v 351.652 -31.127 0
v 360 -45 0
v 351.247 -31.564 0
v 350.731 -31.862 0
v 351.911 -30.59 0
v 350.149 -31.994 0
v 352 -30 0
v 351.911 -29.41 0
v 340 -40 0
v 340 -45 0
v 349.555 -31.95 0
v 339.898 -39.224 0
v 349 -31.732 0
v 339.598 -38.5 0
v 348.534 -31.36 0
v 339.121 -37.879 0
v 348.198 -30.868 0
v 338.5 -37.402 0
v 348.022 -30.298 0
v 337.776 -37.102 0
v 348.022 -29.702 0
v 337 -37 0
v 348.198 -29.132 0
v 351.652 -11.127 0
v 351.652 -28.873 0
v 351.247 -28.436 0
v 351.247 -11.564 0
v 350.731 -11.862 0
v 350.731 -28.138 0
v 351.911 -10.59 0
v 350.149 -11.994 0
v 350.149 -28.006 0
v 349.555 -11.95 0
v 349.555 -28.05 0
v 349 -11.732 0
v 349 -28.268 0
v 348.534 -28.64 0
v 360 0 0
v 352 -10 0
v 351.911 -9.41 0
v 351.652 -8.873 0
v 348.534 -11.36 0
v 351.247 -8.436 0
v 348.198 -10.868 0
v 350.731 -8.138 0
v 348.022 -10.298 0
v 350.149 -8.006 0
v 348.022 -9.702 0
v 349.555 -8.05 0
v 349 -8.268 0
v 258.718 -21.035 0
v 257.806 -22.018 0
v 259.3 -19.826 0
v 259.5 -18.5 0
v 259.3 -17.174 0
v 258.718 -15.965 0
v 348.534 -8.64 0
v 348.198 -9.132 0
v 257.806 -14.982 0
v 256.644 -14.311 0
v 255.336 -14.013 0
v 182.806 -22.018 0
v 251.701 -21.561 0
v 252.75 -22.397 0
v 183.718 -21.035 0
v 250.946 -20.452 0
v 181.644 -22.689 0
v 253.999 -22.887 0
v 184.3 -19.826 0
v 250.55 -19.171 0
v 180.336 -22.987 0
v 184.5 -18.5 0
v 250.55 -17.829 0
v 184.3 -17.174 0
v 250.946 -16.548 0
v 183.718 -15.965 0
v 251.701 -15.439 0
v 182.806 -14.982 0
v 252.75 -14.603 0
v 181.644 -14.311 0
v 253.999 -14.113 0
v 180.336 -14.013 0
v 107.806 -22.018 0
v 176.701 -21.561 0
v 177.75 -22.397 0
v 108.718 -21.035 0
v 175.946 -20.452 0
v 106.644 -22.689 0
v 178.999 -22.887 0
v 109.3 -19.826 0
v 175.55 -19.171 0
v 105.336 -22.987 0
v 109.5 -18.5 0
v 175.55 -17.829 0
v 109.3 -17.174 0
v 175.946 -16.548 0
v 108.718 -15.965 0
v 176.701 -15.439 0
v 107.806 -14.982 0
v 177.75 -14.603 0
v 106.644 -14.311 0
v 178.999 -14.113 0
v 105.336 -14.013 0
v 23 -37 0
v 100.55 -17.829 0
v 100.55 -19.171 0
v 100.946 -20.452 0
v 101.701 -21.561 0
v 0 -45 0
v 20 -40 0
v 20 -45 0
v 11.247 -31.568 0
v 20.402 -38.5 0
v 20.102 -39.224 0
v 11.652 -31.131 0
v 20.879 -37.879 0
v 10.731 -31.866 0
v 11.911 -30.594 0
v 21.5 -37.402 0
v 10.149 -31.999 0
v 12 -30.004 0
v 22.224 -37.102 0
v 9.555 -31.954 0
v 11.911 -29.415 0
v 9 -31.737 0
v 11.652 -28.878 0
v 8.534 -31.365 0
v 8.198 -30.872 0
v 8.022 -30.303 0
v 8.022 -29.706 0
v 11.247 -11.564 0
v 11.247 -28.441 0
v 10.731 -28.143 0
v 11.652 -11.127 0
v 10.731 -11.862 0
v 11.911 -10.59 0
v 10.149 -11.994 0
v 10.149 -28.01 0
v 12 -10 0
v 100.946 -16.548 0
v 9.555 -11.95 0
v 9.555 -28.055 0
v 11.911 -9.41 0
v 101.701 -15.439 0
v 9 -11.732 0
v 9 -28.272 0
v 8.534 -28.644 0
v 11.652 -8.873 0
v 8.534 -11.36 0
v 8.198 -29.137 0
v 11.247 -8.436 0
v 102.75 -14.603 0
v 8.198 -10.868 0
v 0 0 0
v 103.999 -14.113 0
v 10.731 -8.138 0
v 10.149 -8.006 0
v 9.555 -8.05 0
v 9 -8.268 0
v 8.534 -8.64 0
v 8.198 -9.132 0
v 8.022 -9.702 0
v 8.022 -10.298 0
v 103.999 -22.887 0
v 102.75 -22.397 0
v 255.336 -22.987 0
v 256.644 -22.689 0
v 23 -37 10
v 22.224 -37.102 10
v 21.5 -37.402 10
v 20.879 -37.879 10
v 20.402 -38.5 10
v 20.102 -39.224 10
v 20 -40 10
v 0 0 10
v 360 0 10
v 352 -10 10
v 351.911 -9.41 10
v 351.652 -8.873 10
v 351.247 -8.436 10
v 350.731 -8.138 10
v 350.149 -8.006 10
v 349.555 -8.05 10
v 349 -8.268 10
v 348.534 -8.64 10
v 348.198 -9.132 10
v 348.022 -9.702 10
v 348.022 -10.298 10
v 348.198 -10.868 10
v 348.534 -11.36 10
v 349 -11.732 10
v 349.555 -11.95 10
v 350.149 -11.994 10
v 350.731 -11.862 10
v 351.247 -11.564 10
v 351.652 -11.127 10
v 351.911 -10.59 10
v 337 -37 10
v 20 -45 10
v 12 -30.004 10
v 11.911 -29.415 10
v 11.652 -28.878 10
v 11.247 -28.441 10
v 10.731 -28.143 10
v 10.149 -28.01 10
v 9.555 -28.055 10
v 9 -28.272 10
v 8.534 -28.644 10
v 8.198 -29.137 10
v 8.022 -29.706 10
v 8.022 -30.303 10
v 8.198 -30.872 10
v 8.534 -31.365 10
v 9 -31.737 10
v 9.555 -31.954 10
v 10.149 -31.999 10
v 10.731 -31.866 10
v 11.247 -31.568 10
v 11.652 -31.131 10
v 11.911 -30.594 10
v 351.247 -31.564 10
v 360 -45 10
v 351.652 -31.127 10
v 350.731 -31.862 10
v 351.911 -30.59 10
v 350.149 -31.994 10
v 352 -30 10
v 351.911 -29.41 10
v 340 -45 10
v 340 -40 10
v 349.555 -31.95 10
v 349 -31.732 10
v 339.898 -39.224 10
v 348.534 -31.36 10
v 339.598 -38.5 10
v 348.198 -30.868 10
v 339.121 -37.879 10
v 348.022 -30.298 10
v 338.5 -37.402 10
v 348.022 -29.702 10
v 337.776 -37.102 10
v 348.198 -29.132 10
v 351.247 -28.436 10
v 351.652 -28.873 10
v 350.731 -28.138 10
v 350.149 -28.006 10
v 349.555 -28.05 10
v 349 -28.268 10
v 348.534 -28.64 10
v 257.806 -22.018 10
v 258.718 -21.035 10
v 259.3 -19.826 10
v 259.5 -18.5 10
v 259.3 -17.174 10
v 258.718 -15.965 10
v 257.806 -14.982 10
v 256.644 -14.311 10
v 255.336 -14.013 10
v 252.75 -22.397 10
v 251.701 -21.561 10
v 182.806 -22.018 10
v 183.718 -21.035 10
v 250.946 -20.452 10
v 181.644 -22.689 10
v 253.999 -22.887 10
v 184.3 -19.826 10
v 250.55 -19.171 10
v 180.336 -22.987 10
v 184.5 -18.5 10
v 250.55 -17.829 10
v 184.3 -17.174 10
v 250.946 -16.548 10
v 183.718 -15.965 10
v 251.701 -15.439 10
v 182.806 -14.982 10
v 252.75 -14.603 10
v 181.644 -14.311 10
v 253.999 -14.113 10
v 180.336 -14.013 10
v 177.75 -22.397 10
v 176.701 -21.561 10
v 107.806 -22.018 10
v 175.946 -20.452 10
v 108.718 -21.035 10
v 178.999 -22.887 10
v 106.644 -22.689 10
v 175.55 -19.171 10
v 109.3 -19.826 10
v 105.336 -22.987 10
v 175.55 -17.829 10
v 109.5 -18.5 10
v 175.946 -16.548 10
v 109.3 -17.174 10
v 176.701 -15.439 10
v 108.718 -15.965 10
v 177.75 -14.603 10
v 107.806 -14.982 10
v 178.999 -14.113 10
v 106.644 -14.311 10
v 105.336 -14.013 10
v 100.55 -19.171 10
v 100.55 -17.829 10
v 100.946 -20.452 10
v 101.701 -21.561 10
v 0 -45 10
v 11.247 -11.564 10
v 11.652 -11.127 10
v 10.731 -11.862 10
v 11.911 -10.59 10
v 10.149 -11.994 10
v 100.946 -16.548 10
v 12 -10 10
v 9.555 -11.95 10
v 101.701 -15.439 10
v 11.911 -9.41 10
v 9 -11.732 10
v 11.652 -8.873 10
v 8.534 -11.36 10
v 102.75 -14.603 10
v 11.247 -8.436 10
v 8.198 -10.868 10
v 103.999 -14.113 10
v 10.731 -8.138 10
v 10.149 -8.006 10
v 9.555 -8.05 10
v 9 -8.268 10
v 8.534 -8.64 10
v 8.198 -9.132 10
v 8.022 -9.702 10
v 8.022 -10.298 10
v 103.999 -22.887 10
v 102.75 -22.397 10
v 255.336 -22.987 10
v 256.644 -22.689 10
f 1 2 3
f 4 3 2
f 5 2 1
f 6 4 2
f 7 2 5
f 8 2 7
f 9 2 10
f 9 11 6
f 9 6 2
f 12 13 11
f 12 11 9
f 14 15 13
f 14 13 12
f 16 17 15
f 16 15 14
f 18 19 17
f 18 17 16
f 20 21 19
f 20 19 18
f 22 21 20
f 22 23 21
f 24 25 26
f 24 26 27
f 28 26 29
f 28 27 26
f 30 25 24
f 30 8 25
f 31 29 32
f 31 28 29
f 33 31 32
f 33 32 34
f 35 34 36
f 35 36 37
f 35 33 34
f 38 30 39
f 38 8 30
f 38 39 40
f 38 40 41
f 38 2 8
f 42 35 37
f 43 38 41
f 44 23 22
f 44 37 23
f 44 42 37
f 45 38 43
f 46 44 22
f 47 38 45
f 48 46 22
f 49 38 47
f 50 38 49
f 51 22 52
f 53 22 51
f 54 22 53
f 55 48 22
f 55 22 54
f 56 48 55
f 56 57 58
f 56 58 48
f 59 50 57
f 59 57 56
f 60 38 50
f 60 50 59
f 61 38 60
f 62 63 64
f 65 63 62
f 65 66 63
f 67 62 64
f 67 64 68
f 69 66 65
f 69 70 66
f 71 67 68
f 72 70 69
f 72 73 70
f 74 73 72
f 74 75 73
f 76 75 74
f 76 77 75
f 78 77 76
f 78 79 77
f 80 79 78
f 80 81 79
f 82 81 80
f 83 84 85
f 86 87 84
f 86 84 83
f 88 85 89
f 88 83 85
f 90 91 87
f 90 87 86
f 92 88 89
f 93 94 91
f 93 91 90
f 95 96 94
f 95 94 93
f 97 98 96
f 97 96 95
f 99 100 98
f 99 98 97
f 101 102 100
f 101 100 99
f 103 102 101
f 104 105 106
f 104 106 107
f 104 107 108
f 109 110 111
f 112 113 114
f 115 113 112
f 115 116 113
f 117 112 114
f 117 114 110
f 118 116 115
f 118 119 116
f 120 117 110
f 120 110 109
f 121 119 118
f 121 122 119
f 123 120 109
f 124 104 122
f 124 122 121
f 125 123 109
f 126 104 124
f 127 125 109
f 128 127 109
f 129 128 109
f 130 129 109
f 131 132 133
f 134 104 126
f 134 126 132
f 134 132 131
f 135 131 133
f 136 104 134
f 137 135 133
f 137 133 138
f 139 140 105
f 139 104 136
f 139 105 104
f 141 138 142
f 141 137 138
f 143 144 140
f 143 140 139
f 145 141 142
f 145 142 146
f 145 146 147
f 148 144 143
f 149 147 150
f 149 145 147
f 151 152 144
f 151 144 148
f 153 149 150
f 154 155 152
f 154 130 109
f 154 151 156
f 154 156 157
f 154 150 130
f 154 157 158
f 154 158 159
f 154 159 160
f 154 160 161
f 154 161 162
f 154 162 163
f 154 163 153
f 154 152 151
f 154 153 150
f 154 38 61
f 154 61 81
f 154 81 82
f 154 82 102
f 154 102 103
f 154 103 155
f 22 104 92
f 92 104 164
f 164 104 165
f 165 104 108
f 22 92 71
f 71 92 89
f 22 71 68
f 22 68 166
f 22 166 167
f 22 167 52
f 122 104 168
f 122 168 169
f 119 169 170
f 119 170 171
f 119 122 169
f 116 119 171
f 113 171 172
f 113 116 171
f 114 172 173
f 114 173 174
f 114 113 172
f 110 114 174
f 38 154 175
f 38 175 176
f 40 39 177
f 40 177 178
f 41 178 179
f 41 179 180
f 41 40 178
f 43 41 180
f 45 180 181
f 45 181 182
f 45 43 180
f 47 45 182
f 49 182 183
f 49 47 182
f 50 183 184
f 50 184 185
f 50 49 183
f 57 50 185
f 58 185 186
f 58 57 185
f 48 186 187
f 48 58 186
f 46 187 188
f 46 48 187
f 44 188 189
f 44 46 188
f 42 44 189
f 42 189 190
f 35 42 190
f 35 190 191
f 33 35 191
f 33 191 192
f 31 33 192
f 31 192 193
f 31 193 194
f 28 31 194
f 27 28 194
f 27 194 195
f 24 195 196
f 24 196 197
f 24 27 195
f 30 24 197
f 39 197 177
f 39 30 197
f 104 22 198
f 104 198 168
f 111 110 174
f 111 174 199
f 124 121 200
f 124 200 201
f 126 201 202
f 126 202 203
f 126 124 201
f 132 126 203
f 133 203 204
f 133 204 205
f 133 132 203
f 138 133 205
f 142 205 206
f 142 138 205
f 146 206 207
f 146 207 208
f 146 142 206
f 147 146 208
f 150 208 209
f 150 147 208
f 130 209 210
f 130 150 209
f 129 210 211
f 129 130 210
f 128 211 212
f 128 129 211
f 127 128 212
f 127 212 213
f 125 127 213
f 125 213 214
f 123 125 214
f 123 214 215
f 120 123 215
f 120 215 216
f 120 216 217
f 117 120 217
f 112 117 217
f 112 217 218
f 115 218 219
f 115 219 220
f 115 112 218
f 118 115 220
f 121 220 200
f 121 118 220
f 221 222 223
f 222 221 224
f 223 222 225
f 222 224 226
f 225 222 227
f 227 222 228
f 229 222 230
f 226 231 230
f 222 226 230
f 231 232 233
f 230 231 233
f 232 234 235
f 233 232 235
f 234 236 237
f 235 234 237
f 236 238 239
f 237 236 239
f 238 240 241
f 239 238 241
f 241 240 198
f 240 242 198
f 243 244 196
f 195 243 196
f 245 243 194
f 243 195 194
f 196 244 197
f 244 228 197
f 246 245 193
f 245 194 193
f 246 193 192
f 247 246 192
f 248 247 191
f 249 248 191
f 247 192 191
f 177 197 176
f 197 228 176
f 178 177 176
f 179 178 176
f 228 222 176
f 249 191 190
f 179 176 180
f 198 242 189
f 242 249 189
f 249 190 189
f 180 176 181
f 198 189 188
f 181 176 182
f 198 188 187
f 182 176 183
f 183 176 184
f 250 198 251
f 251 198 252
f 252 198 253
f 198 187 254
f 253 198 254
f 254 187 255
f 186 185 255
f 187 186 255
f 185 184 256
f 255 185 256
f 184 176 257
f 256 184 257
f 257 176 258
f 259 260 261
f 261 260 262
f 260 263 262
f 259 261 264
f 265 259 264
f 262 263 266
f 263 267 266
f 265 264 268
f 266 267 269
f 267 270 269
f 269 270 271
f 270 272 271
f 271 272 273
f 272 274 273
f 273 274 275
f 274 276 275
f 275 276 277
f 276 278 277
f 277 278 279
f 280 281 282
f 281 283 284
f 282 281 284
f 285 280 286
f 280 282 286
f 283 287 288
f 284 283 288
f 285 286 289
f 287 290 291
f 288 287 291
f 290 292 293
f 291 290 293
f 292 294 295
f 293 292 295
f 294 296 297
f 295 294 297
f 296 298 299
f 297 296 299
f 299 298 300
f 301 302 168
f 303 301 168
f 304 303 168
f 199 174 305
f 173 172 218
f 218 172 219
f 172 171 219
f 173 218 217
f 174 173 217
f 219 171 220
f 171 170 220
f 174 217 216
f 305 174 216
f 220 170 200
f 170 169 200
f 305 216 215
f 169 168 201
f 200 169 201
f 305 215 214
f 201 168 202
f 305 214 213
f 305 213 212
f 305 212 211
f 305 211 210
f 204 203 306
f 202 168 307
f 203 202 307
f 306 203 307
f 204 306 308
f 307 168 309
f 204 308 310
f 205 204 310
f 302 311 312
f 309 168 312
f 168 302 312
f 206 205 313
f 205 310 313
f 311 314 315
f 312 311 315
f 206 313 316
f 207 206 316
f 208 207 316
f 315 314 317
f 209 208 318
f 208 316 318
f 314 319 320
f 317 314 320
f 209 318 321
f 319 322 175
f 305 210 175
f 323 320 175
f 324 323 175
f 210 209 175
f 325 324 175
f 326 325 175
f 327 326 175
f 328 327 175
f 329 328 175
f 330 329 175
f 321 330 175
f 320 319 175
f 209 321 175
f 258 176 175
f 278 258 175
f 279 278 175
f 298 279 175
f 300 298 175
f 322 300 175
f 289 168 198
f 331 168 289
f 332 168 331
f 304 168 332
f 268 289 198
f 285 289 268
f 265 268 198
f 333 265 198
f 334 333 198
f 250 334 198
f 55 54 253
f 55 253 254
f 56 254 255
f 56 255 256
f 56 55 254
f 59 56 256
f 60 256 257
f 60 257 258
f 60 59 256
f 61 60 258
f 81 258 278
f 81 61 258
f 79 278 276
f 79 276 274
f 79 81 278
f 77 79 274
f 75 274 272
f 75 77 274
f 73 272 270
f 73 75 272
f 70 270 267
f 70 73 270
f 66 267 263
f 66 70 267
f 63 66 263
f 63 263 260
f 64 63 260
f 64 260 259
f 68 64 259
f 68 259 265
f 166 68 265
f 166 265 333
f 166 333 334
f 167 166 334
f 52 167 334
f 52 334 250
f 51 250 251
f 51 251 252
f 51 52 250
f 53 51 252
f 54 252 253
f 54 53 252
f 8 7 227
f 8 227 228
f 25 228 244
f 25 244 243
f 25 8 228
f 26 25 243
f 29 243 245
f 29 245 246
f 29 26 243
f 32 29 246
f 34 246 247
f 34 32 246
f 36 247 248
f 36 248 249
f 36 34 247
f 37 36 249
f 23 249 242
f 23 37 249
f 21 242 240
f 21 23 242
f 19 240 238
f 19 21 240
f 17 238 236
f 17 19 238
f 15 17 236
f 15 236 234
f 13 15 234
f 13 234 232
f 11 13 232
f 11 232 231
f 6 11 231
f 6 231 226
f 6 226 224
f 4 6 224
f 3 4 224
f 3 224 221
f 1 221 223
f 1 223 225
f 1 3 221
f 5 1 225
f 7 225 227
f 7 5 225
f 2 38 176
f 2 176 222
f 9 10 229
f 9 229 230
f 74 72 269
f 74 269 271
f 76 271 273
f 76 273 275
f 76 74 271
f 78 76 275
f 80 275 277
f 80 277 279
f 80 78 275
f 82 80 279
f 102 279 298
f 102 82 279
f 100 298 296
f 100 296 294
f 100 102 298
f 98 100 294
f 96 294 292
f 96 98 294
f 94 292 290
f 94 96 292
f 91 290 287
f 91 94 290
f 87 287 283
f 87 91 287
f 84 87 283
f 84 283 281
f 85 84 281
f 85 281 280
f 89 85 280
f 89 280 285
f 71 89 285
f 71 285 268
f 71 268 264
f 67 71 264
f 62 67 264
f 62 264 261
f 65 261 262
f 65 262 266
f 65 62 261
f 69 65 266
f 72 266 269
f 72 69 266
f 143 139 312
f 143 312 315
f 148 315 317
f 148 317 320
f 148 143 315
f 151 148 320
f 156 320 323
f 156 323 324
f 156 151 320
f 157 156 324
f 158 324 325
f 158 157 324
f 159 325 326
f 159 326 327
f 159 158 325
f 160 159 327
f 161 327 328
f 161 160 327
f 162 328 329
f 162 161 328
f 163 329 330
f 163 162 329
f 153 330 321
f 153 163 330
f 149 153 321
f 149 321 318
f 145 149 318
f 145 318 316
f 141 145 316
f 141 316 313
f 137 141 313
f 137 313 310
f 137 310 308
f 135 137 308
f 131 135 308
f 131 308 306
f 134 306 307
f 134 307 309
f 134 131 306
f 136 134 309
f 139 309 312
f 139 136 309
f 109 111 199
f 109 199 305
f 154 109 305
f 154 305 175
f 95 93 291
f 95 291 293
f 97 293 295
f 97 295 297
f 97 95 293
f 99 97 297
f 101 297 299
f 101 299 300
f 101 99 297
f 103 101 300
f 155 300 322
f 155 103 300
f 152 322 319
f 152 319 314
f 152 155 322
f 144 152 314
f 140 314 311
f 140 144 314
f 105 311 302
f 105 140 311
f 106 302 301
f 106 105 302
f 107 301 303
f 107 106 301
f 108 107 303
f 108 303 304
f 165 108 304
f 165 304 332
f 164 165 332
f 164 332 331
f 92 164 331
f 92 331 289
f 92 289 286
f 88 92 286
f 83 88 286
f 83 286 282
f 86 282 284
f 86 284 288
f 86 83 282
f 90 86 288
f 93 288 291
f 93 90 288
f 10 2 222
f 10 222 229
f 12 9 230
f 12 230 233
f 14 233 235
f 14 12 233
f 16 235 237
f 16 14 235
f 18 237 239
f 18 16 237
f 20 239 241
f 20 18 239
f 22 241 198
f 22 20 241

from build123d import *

# Parameters (mm, degrees)
SKETCH1_R           = 2
SKETCH1_R_2         = 4.5
BOSS_EXTRUDE1_DEPTH = 10


with BuildPart() as part:
    # Sketch1 → Boss-Extrude1 (new body)
    with BuildSketch(Plane.XY):
        with BuildLine():
            Line((0, 0), (360, 0))
            Line((360, 0), (360, -45))
            Line((360, -45), (340, -45))
            Line((340, -45), (340, -40))
            ThreePointArc((340, -40), (339.121320344, -37.878679656), (337, -37))
            Line((337, -37), (23, -37))
            ThreePointArc((23, -37), (20.878679656, -37.878679656), (20, -40))
            Line((20, -40), (20, -45))
            Line((20, -45), (0, -45))
            Line((0, -45), (0, 0))
        make_face()
        with Locations((350, -10)):
            Circle(SKETCH1_R, mode=Mode.SUBTRACT)
        with Locations((350, -30)):
            Circle(SKETCH1_R, mode=Mode.SUBTRACT)
        with Locations((10, -10)):
            Circle(SKETCH1_R, mode=Mode.SUBTRACT)
        with Locations((10, -30.004476127)):
            Circle(SKETCH1_R, mode=Mode.SUBTRACT)
        with Locations((180, -18.5)):
            Circle(SKETCH1_R_2, mode=Mode.SUBTRACT)
        with Locations((255, -18.5)):
            Circle(SKETCH1_R_2, mode=Mode.SUBTRACT)
        with Locations((105, -18.5)):
            Circle(SKETCH1_R_2, mode=Mode.SUBTRACT)
    extrude(amount=BOSS_EXTRUDE1_DEPTH)


solid = part.part
